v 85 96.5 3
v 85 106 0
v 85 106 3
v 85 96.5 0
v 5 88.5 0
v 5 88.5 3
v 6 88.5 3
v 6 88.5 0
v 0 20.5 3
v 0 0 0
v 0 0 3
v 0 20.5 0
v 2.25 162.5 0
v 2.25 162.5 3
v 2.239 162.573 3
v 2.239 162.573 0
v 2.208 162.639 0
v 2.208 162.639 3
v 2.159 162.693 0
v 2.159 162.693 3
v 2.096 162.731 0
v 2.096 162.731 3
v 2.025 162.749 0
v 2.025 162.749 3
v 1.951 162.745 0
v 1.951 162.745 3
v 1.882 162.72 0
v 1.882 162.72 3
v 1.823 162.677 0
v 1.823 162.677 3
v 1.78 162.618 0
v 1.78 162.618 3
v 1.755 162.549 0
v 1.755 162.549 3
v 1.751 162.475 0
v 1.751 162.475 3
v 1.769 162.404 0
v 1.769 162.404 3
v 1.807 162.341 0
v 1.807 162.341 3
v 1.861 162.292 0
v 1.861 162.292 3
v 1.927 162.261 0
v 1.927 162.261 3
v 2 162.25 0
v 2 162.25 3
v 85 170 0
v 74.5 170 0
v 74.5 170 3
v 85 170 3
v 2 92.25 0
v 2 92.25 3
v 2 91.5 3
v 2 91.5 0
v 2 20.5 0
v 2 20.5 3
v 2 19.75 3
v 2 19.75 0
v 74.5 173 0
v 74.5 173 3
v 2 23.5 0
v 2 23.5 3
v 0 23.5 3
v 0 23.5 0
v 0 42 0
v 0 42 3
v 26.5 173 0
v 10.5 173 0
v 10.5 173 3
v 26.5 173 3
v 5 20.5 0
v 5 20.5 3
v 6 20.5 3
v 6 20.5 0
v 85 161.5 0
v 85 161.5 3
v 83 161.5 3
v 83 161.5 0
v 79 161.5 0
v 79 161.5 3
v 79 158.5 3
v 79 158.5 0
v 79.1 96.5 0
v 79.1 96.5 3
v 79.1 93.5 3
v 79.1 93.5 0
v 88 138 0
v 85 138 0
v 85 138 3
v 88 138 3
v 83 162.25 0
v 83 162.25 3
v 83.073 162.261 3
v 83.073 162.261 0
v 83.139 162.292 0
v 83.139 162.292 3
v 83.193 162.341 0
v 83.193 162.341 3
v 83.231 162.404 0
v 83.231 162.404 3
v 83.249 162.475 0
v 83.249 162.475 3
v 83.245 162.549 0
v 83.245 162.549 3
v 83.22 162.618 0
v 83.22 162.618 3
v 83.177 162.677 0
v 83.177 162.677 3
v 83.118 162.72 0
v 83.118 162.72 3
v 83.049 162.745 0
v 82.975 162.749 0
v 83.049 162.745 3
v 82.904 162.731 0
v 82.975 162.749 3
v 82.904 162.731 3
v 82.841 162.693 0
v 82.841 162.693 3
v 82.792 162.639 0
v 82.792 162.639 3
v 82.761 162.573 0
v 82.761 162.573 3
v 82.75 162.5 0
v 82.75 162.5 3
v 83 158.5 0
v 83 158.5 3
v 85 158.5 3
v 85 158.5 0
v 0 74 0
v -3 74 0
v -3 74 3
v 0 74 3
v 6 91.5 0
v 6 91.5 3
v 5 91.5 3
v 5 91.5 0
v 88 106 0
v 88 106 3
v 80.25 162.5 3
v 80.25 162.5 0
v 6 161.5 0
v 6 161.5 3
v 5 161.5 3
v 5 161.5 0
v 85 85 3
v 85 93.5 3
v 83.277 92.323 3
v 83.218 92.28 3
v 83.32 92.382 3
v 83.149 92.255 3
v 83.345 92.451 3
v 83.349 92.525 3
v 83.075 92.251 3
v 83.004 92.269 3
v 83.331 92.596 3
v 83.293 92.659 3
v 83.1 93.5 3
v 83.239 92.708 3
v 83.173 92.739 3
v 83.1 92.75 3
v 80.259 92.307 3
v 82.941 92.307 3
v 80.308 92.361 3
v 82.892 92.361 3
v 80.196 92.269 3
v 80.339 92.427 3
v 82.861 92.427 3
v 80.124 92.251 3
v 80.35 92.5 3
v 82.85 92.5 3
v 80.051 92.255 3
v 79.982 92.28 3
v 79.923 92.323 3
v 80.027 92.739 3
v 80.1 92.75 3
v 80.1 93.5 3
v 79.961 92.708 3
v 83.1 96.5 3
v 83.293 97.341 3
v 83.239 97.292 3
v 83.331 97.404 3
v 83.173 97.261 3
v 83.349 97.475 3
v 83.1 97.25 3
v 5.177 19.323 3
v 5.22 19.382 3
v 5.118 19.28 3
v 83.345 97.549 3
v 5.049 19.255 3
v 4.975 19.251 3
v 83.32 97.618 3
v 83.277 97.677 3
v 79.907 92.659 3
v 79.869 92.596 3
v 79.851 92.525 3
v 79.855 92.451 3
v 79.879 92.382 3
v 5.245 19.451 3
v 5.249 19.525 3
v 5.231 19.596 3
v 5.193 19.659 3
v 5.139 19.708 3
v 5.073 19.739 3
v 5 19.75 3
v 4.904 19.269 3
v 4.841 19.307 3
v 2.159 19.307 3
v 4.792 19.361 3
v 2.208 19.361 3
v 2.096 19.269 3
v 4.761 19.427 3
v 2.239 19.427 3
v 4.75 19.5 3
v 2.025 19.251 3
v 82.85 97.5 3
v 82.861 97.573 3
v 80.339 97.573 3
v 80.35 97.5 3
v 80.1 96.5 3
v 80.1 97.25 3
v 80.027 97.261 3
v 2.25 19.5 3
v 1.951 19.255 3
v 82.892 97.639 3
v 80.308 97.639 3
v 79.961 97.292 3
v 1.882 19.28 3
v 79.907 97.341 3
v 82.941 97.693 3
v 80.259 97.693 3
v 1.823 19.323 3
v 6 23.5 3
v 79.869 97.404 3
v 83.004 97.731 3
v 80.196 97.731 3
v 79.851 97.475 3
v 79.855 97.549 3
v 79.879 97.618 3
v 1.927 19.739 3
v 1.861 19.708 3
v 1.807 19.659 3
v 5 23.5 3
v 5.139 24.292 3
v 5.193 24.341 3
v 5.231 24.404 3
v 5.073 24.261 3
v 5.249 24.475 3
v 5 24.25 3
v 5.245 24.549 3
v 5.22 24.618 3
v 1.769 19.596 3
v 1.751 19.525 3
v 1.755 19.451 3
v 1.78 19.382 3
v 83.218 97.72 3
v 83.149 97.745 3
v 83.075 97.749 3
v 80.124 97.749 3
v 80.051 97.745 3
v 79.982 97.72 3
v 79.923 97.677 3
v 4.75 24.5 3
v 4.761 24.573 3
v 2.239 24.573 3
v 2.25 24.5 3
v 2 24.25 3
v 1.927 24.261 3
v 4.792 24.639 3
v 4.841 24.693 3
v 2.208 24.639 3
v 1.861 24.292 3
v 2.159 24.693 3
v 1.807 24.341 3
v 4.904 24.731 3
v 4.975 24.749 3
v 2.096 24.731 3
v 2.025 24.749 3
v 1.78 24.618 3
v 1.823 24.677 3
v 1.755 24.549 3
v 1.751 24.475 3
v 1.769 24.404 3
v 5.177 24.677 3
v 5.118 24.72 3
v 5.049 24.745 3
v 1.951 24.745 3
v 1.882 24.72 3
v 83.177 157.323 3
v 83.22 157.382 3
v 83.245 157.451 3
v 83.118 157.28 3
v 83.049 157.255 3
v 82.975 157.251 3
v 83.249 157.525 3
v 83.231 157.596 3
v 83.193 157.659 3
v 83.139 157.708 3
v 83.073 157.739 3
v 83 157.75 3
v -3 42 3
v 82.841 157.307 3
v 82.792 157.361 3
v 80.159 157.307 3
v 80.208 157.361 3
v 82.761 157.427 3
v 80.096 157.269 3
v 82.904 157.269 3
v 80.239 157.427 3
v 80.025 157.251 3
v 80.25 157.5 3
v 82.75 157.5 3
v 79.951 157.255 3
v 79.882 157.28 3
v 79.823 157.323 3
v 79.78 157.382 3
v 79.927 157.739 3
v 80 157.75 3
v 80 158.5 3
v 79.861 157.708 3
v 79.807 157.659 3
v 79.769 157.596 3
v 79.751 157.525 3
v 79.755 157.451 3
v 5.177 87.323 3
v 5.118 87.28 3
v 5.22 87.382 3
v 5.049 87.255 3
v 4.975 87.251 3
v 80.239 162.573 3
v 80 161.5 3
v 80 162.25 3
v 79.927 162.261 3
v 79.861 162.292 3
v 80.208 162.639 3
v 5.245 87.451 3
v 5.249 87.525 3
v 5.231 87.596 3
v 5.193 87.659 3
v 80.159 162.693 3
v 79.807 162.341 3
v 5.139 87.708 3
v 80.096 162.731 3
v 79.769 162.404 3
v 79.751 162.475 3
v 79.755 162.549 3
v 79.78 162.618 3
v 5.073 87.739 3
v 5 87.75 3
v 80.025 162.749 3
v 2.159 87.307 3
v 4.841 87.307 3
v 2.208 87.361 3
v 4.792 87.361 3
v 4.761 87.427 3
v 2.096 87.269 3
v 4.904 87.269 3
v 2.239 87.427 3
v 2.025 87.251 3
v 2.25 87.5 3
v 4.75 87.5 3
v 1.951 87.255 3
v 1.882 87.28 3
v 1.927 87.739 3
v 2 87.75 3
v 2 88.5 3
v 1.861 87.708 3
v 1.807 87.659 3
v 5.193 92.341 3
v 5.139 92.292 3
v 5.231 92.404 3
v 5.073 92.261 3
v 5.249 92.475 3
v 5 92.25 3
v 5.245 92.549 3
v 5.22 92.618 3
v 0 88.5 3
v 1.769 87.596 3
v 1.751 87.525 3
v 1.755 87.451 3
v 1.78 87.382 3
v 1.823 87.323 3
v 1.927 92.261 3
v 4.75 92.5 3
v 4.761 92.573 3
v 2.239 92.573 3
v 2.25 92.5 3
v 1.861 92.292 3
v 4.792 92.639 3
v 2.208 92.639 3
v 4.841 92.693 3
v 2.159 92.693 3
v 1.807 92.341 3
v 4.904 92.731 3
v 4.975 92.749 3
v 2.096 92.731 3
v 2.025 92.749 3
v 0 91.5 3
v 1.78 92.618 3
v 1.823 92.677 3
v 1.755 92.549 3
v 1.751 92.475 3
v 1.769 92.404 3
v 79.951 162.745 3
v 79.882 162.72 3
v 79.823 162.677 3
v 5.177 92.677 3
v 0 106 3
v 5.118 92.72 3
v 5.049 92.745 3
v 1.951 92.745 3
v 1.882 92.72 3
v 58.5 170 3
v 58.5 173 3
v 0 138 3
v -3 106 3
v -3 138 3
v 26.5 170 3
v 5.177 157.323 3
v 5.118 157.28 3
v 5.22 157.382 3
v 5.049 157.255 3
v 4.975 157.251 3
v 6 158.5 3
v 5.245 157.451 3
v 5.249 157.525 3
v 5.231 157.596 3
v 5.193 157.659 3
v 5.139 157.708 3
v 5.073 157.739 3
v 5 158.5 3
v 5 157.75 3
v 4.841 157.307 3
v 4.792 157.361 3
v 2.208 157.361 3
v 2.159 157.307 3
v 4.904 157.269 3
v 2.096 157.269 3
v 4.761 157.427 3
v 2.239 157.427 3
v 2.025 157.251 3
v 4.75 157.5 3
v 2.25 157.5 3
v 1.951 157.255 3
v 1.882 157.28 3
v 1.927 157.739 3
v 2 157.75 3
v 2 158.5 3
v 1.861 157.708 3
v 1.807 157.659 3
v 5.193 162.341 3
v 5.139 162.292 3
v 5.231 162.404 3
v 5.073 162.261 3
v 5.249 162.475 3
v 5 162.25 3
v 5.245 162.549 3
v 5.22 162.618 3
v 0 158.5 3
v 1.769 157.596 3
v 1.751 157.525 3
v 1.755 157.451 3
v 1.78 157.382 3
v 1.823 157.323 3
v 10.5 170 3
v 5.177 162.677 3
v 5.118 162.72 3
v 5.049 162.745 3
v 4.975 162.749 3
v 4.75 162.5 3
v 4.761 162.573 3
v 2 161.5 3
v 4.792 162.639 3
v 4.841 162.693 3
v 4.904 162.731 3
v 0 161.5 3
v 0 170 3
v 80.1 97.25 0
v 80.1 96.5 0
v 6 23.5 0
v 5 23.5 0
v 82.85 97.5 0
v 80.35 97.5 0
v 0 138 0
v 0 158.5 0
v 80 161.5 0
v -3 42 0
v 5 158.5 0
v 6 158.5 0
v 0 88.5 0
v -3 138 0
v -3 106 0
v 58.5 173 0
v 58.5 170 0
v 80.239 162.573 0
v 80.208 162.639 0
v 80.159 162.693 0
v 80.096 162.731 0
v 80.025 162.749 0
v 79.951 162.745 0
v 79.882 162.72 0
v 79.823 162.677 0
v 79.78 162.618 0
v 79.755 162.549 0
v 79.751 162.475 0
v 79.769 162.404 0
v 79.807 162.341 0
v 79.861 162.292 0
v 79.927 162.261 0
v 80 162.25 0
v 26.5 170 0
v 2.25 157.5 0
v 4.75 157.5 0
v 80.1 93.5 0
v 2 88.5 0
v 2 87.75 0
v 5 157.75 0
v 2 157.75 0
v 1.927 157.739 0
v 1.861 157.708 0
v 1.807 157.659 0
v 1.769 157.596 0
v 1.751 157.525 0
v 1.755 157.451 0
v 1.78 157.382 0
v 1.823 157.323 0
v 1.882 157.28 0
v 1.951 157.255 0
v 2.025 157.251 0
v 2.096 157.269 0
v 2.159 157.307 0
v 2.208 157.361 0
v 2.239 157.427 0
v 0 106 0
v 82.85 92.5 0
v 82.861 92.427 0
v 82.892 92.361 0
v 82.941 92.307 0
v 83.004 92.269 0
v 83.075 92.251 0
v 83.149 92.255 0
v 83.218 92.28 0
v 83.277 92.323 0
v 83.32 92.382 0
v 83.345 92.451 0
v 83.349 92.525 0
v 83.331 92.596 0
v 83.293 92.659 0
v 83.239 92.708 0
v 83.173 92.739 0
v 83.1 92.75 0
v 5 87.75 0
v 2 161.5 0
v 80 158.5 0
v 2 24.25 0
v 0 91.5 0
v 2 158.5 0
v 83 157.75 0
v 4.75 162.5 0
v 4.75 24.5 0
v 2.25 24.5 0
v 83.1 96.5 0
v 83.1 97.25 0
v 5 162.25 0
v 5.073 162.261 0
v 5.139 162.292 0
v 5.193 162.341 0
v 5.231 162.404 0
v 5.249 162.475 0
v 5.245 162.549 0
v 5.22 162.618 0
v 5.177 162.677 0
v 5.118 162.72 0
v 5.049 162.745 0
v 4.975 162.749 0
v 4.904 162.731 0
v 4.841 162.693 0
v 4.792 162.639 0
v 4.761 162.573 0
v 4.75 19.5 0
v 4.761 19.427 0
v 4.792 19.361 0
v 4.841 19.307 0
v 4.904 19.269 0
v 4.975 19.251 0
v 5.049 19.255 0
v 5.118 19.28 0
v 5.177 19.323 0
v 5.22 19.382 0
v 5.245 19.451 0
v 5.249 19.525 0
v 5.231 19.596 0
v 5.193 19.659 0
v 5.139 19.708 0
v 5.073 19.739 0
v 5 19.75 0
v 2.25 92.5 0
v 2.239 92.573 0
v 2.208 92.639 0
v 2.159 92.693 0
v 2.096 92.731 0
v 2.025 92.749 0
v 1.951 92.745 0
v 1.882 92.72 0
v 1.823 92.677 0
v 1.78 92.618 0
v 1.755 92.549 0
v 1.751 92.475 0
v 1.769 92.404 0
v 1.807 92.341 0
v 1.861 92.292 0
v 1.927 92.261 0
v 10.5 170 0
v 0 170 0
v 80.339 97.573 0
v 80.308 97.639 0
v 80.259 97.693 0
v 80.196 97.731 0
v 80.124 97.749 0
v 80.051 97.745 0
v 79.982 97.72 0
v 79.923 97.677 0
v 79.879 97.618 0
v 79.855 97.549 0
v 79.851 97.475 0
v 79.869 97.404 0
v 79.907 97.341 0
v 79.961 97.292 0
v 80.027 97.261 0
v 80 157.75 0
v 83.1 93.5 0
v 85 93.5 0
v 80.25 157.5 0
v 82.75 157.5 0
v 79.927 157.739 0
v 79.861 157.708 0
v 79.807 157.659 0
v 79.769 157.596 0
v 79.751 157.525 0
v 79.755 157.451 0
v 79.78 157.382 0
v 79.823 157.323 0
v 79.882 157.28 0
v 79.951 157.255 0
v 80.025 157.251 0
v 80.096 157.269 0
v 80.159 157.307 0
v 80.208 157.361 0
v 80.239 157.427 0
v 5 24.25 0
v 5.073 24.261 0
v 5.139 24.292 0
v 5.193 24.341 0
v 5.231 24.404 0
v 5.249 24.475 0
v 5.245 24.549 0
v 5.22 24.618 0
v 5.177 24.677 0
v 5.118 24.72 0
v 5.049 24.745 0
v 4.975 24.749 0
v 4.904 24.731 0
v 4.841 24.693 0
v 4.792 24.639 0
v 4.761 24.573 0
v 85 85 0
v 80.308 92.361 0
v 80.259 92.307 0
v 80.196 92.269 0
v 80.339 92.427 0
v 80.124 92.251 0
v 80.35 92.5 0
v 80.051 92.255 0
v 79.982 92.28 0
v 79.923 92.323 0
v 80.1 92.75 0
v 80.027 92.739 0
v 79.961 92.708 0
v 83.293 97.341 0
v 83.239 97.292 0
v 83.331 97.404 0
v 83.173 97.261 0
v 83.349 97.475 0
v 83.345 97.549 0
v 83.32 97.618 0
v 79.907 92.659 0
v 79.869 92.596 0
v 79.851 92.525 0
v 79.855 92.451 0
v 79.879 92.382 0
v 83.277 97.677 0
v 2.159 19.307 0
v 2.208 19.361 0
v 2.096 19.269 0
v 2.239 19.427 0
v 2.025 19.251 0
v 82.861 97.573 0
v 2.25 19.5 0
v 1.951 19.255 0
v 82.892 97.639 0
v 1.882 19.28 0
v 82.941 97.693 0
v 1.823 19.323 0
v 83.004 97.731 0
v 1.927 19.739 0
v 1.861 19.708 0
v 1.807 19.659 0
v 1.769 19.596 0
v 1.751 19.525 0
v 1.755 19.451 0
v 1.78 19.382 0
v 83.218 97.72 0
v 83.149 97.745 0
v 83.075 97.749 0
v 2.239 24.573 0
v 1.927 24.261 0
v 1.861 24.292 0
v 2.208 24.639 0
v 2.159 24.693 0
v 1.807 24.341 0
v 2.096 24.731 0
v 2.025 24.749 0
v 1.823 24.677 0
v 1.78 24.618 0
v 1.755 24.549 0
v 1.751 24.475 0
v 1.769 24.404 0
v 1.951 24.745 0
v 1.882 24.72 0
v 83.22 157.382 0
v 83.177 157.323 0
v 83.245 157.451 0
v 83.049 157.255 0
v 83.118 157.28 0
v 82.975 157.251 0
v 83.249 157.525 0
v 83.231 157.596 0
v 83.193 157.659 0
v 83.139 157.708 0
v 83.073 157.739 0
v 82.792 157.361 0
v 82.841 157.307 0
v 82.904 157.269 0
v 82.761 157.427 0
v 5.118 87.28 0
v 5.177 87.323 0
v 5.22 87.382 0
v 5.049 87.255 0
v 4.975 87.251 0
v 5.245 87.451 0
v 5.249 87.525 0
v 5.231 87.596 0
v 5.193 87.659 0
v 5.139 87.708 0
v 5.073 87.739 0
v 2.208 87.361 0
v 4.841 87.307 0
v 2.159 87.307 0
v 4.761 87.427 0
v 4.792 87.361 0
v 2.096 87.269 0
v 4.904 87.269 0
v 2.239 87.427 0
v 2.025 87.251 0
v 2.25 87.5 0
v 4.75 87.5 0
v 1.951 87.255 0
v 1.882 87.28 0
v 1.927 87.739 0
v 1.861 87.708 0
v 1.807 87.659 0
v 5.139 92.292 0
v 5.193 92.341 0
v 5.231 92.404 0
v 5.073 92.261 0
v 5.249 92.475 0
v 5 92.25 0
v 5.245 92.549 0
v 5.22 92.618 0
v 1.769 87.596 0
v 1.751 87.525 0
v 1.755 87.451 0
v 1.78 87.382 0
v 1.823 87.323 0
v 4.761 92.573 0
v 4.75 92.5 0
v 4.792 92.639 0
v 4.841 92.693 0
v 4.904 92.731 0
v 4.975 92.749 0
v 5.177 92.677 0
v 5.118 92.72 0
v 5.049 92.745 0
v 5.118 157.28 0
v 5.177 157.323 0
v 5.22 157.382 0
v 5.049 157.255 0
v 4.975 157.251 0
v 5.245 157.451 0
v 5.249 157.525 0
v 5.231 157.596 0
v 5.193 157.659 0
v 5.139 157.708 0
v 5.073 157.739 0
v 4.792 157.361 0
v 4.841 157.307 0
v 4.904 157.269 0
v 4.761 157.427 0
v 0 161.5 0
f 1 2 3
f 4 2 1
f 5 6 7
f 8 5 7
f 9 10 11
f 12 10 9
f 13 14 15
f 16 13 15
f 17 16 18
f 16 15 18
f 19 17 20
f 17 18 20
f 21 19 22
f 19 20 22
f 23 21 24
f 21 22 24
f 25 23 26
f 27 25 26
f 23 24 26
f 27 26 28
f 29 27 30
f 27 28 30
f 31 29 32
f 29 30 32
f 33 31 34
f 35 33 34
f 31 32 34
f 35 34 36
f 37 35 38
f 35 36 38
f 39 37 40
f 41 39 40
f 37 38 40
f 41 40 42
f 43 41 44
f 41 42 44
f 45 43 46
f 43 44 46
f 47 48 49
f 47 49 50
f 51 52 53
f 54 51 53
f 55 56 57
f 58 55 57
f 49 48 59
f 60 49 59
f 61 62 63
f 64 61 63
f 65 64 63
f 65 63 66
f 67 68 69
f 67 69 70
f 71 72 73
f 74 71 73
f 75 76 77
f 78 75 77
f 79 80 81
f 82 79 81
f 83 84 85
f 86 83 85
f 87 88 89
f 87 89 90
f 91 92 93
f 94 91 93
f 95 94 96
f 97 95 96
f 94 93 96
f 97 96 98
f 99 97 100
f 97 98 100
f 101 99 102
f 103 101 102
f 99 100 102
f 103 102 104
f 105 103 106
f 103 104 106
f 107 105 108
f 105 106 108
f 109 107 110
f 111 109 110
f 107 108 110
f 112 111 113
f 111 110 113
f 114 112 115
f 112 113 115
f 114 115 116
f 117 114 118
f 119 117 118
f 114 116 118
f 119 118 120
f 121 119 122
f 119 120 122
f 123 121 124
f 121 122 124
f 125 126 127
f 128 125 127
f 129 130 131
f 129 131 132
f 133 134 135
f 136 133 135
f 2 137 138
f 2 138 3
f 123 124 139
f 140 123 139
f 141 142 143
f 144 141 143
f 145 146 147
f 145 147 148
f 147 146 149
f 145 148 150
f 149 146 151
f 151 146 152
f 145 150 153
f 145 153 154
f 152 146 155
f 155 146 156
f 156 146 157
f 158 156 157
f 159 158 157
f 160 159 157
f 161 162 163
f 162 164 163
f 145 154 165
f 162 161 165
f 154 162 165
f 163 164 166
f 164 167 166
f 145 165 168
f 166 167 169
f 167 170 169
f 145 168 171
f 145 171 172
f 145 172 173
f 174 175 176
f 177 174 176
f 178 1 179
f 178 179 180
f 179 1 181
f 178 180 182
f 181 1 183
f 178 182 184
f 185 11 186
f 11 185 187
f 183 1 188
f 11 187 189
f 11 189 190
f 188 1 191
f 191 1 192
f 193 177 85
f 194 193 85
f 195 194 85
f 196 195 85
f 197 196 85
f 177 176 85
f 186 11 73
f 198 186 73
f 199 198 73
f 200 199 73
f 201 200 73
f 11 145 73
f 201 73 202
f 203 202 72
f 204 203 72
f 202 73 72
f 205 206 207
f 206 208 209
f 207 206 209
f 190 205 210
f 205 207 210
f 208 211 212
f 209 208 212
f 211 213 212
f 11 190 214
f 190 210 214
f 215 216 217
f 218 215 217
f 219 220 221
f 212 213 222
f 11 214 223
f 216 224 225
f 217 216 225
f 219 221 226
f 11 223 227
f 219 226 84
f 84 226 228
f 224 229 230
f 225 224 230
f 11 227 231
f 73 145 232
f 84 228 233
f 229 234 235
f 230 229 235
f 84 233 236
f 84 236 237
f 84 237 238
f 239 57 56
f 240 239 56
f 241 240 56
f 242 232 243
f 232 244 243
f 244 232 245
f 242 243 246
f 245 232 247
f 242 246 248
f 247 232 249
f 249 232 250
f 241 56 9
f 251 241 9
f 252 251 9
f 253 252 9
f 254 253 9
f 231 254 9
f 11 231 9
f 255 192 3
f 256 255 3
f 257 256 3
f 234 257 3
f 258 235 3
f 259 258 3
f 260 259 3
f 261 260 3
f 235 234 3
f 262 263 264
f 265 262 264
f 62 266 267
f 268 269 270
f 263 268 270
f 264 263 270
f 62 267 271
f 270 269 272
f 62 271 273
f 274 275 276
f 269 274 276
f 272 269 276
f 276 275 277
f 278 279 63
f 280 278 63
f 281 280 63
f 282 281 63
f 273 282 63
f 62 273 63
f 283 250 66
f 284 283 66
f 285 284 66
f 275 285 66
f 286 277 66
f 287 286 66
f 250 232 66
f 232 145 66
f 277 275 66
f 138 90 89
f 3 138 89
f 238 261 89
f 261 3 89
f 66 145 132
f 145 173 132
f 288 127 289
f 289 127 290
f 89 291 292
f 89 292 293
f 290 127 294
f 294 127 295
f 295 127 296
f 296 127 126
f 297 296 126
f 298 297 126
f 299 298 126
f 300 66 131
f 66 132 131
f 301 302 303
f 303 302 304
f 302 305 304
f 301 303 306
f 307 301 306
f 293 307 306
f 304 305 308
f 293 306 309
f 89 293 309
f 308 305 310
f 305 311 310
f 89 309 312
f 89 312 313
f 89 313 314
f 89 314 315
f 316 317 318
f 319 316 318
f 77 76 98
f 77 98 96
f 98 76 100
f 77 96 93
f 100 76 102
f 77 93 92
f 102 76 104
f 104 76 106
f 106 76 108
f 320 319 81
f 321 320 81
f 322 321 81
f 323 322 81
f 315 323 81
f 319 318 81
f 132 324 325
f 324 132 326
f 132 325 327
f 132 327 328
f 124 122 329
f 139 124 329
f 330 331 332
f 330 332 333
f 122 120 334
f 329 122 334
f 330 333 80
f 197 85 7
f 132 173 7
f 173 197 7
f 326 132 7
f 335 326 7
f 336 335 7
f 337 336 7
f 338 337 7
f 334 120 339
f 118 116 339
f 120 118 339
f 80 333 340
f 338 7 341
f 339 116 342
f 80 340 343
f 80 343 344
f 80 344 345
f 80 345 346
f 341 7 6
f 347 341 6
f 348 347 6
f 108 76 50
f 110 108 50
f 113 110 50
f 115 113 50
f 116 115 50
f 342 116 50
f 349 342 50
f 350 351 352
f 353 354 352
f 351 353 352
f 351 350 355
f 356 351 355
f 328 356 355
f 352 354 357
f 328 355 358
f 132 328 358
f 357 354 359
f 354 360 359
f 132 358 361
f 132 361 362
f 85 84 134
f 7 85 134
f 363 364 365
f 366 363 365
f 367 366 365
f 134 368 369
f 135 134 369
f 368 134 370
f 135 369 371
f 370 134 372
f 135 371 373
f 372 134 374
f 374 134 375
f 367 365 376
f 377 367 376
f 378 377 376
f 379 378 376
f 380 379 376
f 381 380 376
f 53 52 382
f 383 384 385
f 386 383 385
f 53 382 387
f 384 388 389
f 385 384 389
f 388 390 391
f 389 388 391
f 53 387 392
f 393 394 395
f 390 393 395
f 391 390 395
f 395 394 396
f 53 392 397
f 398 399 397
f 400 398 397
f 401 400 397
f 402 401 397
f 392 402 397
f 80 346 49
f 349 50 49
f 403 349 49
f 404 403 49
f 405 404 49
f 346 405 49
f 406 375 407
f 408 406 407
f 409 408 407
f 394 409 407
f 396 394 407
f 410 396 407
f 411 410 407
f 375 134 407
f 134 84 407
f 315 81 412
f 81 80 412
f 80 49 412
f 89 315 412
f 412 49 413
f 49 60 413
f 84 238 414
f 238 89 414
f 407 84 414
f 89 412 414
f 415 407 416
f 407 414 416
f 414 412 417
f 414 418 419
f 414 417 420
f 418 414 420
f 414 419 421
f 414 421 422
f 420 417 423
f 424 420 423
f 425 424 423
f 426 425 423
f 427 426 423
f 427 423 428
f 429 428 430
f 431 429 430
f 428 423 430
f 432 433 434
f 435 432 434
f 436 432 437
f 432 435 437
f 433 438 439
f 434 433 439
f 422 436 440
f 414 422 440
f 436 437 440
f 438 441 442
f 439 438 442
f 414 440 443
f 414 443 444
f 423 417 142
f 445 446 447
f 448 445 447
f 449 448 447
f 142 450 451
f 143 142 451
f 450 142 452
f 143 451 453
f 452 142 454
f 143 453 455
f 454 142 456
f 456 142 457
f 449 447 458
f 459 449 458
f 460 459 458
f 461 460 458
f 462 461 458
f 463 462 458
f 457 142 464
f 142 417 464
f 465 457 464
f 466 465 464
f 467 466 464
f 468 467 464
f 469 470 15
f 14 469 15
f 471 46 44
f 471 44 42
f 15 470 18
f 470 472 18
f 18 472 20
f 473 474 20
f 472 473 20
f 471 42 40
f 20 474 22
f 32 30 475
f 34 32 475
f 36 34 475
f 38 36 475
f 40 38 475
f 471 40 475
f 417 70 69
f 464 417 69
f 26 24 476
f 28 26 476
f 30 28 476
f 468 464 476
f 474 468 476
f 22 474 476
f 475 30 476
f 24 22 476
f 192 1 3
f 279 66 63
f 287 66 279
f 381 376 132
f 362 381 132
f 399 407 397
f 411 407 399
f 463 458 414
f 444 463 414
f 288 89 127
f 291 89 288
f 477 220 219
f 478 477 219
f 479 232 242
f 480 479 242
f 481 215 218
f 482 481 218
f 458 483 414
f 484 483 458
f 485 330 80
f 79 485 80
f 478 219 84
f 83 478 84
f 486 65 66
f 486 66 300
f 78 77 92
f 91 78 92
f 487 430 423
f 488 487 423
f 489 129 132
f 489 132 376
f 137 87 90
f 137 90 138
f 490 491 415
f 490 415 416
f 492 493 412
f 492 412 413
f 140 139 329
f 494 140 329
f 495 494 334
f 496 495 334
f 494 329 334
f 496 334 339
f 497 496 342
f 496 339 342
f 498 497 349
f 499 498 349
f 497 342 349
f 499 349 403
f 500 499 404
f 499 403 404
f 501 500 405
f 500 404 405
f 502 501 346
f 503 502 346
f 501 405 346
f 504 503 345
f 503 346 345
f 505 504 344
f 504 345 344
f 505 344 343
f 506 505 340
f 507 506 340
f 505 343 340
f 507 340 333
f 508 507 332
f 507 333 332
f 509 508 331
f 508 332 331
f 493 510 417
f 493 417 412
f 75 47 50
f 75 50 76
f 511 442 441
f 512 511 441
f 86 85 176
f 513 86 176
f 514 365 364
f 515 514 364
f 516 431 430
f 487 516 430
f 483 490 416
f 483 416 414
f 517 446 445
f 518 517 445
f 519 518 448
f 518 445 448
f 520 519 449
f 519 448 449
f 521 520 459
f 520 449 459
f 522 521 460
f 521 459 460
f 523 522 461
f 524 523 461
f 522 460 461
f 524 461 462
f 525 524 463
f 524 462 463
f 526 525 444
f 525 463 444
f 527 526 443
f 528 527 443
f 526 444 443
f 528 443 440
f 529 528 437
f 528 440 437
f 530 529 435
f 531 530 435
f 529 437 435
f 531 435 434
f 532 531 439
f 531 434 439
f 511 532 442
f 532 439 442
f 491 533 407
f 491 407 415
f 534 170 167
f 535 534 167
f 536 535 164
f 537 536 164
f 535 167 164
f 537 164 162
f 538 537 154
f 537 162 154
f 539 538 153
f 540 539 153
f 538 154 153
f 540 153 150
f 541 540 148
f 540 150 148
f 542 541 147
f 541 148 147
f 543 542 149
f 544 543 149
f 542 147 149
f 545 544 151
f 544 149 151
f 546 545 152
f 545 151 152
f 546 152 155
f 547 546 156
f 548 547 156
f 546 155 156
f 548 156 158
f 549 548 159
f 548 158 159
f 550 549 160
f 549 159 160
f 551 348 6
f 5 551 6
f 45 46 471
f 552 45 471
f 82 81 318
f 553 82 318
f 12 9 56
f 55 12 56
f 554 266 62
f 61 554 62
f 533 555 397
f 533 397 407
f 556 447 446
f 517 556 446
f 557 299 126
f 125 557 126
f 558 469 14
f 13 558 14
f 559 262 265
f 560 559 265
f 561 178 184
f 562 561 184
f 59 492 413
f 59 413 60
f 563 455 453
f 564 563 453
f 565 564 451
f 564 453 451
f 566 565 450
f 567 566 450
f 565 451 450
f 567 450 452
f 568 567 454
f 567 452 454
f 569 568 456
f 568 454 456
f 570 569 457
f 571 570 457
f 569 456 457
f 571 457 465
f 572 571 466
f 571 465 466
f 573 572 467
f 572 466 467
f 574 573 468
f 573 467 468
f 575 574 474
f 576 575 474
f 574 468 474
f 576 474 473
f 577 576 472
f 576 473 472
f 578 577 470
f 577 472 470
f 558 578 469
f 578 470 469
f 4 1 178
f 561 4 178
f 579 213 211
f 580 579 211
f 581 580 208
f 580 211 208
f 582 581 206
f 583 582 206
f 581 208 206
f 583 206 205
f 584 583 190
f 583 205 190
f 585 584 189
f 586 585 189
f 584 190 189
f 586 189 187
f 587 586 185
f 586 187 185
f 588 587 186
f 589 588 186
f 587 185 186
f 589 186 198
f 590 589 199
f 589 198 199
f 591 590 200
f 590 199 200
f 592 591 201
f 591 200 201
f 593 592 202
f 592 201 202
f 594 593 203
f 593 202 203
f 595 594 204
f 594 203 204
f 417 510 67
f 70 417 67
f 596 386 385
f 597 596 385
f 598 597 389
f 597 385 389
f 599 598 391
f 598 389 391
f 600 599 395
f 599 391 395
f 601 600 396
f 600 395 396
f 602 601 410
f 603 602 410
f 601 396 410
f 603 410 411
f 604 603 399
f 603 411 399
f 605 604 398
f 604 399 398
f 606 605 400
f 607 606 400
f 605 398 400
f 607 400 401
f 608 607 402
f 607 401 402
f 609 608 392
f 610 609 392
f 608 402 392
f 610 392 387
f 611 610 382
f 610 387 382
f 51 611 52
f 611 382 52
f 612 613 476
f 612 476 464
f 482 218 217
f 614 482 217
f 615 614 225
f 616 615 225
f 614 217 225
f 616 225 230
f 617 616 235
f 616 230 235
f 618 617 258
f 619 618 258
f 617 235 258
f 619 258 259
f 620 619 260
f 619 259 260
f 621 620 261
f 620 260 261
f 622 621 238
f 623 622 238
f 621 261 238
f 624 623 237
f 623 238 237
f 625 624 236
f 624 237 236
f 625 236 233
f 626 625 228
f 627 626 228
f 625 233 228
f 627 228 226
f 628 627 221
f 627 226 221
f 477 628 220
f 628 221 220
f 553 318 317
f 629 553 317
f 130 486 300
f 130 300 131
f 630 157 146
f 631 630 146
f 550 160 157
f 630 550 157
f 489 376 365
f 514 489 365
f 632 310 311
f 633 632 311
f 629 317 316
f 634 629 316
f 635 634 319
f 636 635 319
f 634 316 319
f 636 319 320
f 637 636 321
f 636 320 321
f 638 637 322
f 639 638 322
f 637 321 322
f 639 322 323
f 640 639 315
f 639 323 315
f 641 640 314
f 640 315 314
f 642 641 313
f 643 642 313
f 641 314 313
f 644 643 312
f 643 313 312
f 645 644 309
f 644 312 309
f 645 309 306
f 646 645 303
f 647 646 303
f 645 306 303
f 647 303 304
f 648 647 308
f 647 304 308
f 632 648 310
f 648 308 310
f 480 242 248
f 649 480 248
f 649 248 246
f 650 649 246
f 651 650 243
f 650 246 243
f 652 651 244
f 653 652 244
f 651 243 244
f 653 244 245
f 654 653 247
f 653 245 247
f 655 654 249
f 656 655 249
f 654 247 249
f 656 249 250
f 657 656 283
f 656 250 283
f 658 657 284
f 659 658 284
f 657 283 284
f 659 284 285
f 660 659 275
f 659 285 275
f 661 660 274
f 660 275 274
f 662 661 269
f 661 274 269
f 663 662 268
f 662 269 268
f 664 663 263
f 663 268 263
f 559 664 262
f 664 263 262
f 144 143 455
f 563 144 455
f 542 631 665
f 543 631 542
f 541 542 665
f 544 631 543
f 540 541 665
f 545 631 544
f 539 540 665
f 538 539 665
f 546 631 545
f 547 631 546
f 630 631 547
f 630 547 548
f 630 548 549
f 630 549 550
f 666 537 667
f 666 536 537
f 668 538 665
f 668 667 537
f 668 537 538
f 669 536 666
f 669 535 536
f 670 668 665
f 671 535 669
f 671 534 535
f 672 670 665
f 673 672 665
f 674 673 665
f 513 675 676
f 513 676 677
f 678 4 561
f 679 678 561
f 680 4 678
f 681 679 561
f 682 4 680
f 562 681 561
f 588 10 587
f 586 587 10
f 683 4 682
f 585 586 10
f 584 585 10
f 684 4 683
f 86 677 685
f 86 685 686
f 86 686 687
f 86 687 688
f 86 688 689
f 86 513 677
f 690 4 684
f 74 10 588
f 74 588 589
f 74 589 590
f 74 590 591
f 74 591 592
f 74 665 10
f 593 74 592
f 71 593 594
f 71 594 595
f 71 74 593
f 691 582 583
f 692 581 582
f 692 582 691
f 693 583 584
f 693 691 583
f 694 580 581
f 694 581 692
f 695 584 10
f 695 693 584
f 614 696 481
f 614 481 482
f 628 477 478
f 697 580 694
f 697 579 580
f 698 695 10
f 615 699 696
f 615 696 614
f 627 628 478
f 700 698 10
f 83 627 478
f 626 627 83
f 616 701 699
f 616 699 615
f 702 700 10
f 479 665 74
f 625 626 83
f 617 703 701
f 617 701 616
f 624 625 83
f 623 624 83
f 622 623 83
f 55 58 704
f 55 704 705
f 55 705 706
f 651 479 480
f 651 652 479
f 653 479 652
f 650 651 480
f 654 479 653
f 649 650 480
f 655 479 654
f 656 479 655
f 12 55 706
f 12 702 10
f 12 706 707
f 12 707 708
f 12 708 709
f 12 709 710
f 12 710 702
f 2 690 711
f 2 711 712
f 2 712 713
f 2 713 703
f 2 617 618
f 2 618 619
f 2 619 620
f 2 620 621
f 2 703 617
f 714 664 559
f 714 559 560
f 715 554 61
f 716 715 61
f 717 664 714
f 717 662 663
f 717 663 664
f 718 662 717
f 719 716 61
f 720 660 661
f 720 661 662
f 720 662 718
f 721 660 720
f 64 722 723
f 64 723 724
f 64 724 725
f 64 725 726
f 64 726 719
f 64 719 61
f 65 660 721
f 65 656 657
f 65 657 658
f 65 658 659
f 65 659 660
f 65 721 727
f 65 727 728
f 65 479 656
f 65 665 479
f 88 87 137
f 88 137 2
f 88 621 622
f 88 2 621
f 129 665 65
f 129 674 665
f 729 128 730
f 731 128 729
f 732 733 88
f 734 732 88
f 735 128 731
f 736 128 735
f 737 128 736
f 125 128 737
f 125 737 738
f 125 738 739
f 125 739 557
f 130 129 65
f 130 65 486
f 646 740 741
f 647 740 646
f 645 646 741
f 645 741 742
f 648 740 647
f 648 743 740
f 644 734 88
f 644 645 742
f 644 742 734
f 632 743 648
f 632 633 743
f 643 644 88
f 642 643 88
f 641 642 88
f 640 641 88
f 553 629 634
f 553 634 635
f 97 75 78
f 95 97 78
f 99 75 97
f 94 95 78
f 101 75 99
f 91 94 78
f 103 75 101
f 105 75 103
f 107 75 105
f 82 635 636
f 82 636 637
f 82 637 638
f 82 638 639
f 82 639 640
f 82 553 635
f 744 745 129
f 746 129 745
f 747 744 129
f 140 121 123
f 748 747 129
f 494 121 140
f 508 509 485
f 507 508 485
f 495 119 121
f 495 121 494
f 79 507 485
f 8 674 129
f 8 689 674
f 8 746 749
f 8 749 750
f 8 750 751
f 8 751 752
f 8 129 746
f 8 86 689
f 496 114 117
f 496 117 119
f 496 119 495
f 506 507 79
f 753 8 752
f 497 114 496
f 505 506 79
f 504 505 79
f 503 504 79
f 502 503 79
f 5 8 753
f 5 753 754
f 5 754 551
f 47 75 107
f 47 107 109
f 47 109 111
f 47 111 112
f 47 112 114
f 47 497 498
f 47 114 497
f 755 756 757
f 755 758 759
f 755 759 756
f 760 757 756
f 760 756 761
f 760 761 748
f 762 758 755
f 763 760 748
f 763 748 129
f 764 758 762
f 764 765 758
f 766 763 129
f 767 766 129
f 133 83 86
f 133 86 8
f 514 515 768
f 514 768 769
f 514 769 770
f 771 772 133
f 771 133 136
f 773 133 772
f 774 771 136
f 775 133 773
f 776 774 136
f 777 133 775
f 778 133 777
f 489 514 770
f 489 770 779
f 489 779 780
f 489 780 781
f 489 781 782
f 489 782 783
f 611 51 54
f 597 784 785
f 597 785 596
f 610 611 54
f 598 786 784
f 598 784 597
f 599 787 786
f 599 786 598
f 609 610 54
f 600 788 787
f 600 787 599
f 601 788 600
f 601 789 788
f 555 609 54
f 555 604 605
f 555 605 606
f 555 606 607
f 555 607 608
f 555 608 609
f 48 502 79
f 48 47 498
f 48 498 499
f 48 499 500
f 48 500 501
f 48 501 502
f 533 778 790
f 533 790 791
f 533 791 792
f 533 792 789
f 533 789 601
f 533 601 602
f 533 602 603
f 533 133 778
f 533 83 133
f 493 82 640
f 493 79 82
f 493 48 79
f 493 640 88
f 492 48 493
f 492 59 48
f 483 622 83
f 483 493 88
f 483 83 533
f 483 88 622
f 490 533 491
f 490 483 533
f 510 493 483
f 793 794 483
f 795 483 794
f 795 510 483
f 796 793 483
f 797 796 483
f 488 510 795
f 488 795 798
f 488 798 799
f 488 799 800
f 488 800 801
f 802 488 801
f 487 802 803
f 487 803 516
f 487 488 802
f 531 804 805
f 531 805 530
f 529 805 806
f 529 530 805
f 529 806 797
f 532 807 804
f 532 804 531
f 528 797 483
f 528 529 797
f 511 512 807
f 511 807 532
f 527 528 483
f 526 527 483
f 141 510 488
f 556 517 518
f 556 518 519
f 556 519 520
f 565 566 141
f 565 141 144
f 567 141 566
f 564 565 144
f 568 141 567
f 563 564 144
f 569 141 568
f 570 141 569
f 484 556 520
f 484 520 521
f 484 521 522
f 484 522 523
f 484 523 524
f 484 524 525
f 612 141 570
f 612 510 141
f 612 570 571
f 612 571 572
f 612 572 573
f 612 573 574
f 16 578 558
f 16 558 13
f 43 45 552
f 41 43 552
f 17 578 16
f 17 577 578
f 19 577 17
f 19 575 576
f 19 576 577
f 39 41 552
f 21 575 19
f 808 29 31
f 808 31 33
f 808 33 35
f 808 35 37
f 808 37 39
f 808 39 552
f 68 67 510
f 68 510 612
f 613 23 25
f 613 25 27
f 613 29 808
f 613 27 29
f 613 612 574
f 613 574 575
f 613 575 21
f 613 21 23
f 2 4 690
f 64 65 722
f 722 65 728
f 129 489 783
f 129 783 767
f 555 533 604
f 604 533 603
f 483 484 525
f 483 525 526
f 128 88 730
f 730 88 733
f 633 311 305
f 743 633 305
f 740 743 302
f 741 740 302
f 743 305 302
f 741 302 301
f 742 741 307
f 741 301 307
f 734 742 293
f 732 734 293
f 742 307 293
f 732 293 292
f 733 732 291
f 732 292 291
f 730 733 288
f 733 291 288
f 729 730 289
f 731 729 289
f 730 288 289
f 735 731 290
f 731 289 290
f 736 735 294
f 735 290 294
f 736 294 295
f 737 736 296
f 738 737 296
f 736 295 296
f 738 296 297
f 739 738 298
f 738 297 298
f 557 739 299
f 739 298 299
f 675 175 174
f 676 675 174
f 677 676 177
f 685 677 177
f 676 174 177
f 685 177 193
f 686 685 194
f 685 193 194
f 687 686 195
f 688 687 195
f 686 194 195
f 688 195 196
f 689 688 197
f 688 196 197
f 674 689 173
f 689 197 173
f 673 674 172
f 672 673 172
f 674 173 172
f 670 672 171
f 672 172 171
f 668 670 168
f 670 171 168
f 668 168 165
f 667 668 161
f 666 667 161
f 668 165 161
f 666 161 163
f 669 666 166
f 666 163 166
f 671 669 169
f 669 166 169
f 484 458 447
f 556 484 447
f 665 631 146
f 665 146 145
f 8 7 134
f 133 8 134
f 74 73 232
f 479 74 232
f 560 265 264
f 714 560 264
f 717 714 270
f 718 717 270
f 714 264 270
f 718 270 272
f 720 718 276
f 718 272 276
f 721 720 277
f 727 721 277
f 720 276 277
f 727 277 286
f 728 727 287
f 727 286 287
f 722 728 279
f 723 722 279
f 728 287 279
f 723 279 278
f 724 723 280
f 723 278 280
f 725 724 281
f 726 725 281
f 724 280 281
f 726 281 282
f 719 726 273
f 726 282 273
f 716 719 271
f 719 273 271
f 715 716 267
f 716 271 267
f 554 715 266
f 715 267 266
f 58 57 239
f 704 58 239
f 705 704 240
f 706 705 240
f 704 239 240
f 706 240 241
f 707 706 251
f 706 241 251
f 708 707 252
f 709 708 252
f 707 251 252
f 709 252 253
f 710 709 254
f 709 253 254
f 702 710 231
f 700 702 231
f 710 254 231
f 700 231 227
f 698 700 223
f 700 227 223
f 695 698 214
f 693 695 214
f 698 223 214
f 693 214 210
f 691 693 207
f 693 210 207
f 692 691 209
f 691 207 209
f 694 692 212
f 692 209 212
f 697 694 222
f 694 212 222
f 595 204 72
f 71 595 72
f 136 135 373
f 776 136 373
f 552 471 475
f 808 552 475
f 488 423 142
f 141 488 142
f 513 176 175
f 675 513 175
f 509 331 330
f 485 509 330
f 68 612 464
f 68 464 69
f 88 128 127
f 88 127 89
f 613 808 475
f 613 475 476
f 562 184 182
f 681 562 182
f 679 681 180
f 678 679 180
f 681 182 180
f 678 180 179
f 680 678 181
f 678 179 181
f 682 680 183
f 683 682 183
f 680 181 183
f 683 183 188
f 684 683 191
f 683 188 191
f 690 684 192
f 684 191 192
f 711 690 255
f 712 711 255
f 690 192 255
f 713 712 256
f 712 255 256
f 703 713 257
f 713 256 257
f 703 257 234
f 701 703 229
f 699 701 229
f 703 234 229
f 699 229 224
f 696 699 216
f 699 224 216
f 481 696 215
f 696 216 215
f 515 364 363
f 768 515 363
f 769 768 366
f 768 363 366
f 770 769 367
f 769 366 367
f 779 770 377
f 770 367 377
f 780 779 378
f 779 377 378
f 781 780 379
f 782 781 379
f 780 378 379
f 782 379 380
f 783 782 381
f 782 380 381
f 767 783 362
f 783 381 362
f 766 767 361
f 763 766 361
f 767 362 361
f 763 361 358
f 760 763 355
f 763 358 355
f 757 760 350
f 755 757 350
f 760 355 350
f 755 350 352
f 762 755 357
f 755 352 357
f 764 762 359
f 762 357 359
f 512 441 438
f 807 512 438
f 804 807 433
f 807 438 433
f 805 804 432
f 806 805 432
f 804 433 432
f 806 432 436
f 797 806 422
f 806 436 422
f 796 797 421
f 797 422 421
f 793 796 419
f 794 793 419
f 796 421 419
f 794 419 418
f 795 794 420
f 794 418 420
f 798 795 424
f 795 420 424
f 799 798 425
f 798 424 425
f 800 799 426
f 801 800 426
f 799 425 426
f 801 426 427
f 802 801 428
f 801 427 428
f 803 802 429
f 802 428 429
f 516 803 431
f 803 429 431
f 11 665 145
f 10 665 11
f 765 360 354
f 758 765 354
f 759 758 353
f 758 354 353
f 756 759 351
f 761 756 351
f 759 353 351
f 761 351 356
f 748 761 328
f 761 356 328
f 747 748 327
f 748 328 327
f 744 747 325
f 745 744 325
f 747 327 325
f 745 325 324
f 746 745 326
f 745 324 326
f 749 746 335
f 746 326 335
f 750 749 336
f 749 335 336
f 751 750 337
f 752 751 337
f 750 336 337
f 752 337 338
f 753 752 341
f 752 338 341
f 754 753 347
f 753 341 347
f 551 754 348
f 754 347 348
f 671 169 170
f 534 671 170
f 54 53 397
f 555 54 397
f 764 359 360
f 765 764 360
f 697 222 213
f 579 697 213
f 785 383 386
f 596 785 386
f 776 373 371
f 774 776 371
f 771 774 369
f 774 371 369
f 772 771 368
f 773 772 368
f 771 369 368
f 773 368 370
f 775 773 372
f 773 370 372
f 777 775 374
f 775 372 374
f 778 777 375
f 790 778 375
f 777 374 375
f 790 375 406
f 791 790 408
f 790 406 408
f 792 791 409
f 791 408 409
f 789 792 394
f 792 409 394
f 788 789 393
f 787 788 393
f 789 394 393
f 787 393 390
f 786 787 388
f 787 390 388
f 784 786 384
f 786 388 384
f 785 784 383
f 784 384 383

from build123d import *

# Parameters (mm, degrees)
CROQUIS1_W              = 16
CROQUIS1_H              = 3
SALIENTE_EXTRUIR1_DEPTH = 3
CORTAR_EXTRUIR1_DEPTH   = 195.118520497


with BuildPart() as part:
    # Croquis1 → Saliente-Extruir1 (new body)
    with BuildSketch(Plane.XY):
        Polygon((85, 106), (85, 85), (0, 0), (0, 42), (-3, 42), (-3, 74), (0, 74), (0, 106), (-3, 106), (-3, 138), (0, 138), (0, 170), (85, 170), (85, 138), (88, 138), (88, 106), align=None)
        with Locations((66.5, 171.5)):
            Rectangle(CROQUIS1_W, CROQUIS1_H)
        with Locations((18.5, 171.5)):
            Rectangle(CROQUIS1_W, CROQUIS1_H)
    extrude(amount=SALIENTE_EXTRUIR1_DEPTH)

    # Croquis2 → Cortar-Extruir1 (cut, through all)
    with BuildSketch(Plane.XY.offset(3)):
        with BuildLine():
            Line((2, 91.5), (0, 91.5))
            Line((0, 91.5), (0, 88.5))
            Line((0, 88.5), (2, 88.5))
            Line((2, 88.5), (2, 87.75))
            ThreePointArc((2, 87.75), (1.823223305, 87.323223305), (2.25, 87.5))
            Line((2.25, 87.5), (4.75, 87.5))
            ThreePointArc((4.75, 87.5), (5.176776695, 87.323223305), (5, 87.75))
            Line((5, 87.75), (5, 88.5))
            Line((5, 88.5), (6, 88.5))
            Line((6, 88.5), (6, 91.5))
            Line((6, 91.5), (5, 91.5))
            Line((5, 91.5), (5, 92.25))
            ThreePointArc((5, 92.25), (5.176776695, 92.676776695), (4.75, 92.5))
            Line((4.75, 92.5), (2.25, 92.5))
            ThreePointArc((2.25, 92.5), (1.823223305, 92.676776695), (2, 92.25))
            Line((2, 92.25), (2, 91.5))
        make_face()
        with BuildLine():
            Line((2, 161.5), (0, 161.5))
            Line((0, 161.5), (0, 158.5))
            Line((0, 158.5), (2, 158.5))
            Line((2, 158.5), (2, 157.75))
            ThreePointArc((2, 157.75), (1.823223305, 157.323223305), (2.25, 157.5))
            Line((2.25, 157.5), (4.75, 157.5))
            ThreePointArc((4.75, 157.5), (5.176776695, 157.323223305), (5, 157.75))
            Line((5, 157.75), (5, 158.5))
            Line((5, 158.5), (6, 158.5))
            Line((6, 158.5), (6, 161.5))
            Line((6, 161.5), (5, 161.5))
            Line((5, 161.5), (5, 162.25))
            ThreePointArc((5, 162.25), (5.176776695, 162.676776695), (4.75, 162.5))
            Line((4.75, 162.5), (2.25, 162.5))
            ThreePointArc((2.25, 162.5), (1.823223305, 162.676776695), (2, 162.25))
            Line((2, 162.25), (2, 161.5))
        make_face()
        with BuildLine():
            Line((83, 158.5), (85, 158.5))
            Line((85, 158.5), (85, 161.5))
            Line((85, 161.5), (83, 161.5))
            Line((83, 161.5), (83, 162.25))
            ThreePointArc((83, 162.25), (83.176776695, 162.676776695), (82.75, 162.5))
            Line((82.75, 162.5), (80.25, 162.5))
            ThreePointArc((80.25, 162.5), (79.823223305, 162.676776695), (80, 162.25))
            Line((80, 162.25), (80, 161.5))
            Line((80, 161.5), (79, 161.5))
            Line((79, 161.5), (79, 158.5))
            Line((79, 158.5), (80, 158.5))
            Line((80, 158.5), (80, 157.75))
            ThreePointArc((80, 157.75), (79.823223305, 157.323223305), (80.25, 157.5))
            Line((80.25, 157.5), (82.75, 157.5))
            ThreePointArc((82.75, 157.5), (83.176776695, 157.323223305), (83, 157.75))
            Line((83, 157.75), (83, 158.5))
        make_face()
        with BuildLine():
            Line((2, 23.5), (0, 23.5))
            Line((0, 23.5), (0, 20.5))
            Line((0, 20.5), (2, 20.5))
            Line((2, 20.5), (2, 19.75))
            ThreePointArc((2, 19.75), (1.823223305, 19.323223305), (2.25, 19.5))
            Line((2.25, 19.5), (4.75, 19.5))
            ThreePointArc((4.75, 19.5), (5.176776695, 19.323223305), (5, 19.75))
            Line((5, 19.75), (5, 20.5))
            Line((5, 20.5), (6, 20.5))
            Line((6, 20.5), (6, 23.5))
            Line((6, 23.5), (5, 23.5))
            Line((5, 23.5), (5, 24.25))
            ThreePointArc((5, 24.25), (5.176776695, 24.676776695), (4.75, 24.5))
            Line((4.75, 24.5), (2.25, 24.5))
            ThreePointArc((2.25, 24.5), (1.823223305, 24.676776695), (2, 24.25))
            Line((2, 24.25), (2, 23.5))
        make_face()
        with BuildLine():
            Line((83.099943711, 93.5), (85, 93.5))
            Line((85, 93.5), (85, 96.5))
            Line((85, 96.5), (83.099943711, 96.5))
            Line((83.099943711, 96.5), (83.099943711, 97.25))
            ThreePointArc((83.099943711, 97.25), (83.276720406, 97.676776695), (82.849943711, 97.5))
            Line((82.849943711, 97.5), (80.349943711, 97.5))
            ThreePointArc((80.349943711, 97.5), (79.923167016, 97.676776695), (80.099943711, 97.25))
            Line((80.099943711, 97.25), (80.099943711, 96.5))
            Line((80.099943711, 96.5), (79.099943711, 96.5))
            Line((79.099943711, 96.5), (79.099943711, 93.5))
            Line((79.099943711, 93.5), (80.099943711, 93.5))
            Line((80.099943711, 93.5), (80.099943711, 92.75))
            ThreePointArc((80.099943711, 92.75), (79.923167016, 92.323223305), (80.349943711, 92.5))
            Line((80.349943711, 92.5), (82.849943711, 92.5))
            ThreePointArc((82.849943711, 92.5), (83.276720406, 92.323223305), (83.099943711, 92.75))
            Line((83.099943711, 92.75), (83.099943711, 93.5))
        make_face()
    extrude(amount=-CORTAR_EXTRUIR1_DEPTH, mode=Mode.SUBTRACT)


solid = part.part
